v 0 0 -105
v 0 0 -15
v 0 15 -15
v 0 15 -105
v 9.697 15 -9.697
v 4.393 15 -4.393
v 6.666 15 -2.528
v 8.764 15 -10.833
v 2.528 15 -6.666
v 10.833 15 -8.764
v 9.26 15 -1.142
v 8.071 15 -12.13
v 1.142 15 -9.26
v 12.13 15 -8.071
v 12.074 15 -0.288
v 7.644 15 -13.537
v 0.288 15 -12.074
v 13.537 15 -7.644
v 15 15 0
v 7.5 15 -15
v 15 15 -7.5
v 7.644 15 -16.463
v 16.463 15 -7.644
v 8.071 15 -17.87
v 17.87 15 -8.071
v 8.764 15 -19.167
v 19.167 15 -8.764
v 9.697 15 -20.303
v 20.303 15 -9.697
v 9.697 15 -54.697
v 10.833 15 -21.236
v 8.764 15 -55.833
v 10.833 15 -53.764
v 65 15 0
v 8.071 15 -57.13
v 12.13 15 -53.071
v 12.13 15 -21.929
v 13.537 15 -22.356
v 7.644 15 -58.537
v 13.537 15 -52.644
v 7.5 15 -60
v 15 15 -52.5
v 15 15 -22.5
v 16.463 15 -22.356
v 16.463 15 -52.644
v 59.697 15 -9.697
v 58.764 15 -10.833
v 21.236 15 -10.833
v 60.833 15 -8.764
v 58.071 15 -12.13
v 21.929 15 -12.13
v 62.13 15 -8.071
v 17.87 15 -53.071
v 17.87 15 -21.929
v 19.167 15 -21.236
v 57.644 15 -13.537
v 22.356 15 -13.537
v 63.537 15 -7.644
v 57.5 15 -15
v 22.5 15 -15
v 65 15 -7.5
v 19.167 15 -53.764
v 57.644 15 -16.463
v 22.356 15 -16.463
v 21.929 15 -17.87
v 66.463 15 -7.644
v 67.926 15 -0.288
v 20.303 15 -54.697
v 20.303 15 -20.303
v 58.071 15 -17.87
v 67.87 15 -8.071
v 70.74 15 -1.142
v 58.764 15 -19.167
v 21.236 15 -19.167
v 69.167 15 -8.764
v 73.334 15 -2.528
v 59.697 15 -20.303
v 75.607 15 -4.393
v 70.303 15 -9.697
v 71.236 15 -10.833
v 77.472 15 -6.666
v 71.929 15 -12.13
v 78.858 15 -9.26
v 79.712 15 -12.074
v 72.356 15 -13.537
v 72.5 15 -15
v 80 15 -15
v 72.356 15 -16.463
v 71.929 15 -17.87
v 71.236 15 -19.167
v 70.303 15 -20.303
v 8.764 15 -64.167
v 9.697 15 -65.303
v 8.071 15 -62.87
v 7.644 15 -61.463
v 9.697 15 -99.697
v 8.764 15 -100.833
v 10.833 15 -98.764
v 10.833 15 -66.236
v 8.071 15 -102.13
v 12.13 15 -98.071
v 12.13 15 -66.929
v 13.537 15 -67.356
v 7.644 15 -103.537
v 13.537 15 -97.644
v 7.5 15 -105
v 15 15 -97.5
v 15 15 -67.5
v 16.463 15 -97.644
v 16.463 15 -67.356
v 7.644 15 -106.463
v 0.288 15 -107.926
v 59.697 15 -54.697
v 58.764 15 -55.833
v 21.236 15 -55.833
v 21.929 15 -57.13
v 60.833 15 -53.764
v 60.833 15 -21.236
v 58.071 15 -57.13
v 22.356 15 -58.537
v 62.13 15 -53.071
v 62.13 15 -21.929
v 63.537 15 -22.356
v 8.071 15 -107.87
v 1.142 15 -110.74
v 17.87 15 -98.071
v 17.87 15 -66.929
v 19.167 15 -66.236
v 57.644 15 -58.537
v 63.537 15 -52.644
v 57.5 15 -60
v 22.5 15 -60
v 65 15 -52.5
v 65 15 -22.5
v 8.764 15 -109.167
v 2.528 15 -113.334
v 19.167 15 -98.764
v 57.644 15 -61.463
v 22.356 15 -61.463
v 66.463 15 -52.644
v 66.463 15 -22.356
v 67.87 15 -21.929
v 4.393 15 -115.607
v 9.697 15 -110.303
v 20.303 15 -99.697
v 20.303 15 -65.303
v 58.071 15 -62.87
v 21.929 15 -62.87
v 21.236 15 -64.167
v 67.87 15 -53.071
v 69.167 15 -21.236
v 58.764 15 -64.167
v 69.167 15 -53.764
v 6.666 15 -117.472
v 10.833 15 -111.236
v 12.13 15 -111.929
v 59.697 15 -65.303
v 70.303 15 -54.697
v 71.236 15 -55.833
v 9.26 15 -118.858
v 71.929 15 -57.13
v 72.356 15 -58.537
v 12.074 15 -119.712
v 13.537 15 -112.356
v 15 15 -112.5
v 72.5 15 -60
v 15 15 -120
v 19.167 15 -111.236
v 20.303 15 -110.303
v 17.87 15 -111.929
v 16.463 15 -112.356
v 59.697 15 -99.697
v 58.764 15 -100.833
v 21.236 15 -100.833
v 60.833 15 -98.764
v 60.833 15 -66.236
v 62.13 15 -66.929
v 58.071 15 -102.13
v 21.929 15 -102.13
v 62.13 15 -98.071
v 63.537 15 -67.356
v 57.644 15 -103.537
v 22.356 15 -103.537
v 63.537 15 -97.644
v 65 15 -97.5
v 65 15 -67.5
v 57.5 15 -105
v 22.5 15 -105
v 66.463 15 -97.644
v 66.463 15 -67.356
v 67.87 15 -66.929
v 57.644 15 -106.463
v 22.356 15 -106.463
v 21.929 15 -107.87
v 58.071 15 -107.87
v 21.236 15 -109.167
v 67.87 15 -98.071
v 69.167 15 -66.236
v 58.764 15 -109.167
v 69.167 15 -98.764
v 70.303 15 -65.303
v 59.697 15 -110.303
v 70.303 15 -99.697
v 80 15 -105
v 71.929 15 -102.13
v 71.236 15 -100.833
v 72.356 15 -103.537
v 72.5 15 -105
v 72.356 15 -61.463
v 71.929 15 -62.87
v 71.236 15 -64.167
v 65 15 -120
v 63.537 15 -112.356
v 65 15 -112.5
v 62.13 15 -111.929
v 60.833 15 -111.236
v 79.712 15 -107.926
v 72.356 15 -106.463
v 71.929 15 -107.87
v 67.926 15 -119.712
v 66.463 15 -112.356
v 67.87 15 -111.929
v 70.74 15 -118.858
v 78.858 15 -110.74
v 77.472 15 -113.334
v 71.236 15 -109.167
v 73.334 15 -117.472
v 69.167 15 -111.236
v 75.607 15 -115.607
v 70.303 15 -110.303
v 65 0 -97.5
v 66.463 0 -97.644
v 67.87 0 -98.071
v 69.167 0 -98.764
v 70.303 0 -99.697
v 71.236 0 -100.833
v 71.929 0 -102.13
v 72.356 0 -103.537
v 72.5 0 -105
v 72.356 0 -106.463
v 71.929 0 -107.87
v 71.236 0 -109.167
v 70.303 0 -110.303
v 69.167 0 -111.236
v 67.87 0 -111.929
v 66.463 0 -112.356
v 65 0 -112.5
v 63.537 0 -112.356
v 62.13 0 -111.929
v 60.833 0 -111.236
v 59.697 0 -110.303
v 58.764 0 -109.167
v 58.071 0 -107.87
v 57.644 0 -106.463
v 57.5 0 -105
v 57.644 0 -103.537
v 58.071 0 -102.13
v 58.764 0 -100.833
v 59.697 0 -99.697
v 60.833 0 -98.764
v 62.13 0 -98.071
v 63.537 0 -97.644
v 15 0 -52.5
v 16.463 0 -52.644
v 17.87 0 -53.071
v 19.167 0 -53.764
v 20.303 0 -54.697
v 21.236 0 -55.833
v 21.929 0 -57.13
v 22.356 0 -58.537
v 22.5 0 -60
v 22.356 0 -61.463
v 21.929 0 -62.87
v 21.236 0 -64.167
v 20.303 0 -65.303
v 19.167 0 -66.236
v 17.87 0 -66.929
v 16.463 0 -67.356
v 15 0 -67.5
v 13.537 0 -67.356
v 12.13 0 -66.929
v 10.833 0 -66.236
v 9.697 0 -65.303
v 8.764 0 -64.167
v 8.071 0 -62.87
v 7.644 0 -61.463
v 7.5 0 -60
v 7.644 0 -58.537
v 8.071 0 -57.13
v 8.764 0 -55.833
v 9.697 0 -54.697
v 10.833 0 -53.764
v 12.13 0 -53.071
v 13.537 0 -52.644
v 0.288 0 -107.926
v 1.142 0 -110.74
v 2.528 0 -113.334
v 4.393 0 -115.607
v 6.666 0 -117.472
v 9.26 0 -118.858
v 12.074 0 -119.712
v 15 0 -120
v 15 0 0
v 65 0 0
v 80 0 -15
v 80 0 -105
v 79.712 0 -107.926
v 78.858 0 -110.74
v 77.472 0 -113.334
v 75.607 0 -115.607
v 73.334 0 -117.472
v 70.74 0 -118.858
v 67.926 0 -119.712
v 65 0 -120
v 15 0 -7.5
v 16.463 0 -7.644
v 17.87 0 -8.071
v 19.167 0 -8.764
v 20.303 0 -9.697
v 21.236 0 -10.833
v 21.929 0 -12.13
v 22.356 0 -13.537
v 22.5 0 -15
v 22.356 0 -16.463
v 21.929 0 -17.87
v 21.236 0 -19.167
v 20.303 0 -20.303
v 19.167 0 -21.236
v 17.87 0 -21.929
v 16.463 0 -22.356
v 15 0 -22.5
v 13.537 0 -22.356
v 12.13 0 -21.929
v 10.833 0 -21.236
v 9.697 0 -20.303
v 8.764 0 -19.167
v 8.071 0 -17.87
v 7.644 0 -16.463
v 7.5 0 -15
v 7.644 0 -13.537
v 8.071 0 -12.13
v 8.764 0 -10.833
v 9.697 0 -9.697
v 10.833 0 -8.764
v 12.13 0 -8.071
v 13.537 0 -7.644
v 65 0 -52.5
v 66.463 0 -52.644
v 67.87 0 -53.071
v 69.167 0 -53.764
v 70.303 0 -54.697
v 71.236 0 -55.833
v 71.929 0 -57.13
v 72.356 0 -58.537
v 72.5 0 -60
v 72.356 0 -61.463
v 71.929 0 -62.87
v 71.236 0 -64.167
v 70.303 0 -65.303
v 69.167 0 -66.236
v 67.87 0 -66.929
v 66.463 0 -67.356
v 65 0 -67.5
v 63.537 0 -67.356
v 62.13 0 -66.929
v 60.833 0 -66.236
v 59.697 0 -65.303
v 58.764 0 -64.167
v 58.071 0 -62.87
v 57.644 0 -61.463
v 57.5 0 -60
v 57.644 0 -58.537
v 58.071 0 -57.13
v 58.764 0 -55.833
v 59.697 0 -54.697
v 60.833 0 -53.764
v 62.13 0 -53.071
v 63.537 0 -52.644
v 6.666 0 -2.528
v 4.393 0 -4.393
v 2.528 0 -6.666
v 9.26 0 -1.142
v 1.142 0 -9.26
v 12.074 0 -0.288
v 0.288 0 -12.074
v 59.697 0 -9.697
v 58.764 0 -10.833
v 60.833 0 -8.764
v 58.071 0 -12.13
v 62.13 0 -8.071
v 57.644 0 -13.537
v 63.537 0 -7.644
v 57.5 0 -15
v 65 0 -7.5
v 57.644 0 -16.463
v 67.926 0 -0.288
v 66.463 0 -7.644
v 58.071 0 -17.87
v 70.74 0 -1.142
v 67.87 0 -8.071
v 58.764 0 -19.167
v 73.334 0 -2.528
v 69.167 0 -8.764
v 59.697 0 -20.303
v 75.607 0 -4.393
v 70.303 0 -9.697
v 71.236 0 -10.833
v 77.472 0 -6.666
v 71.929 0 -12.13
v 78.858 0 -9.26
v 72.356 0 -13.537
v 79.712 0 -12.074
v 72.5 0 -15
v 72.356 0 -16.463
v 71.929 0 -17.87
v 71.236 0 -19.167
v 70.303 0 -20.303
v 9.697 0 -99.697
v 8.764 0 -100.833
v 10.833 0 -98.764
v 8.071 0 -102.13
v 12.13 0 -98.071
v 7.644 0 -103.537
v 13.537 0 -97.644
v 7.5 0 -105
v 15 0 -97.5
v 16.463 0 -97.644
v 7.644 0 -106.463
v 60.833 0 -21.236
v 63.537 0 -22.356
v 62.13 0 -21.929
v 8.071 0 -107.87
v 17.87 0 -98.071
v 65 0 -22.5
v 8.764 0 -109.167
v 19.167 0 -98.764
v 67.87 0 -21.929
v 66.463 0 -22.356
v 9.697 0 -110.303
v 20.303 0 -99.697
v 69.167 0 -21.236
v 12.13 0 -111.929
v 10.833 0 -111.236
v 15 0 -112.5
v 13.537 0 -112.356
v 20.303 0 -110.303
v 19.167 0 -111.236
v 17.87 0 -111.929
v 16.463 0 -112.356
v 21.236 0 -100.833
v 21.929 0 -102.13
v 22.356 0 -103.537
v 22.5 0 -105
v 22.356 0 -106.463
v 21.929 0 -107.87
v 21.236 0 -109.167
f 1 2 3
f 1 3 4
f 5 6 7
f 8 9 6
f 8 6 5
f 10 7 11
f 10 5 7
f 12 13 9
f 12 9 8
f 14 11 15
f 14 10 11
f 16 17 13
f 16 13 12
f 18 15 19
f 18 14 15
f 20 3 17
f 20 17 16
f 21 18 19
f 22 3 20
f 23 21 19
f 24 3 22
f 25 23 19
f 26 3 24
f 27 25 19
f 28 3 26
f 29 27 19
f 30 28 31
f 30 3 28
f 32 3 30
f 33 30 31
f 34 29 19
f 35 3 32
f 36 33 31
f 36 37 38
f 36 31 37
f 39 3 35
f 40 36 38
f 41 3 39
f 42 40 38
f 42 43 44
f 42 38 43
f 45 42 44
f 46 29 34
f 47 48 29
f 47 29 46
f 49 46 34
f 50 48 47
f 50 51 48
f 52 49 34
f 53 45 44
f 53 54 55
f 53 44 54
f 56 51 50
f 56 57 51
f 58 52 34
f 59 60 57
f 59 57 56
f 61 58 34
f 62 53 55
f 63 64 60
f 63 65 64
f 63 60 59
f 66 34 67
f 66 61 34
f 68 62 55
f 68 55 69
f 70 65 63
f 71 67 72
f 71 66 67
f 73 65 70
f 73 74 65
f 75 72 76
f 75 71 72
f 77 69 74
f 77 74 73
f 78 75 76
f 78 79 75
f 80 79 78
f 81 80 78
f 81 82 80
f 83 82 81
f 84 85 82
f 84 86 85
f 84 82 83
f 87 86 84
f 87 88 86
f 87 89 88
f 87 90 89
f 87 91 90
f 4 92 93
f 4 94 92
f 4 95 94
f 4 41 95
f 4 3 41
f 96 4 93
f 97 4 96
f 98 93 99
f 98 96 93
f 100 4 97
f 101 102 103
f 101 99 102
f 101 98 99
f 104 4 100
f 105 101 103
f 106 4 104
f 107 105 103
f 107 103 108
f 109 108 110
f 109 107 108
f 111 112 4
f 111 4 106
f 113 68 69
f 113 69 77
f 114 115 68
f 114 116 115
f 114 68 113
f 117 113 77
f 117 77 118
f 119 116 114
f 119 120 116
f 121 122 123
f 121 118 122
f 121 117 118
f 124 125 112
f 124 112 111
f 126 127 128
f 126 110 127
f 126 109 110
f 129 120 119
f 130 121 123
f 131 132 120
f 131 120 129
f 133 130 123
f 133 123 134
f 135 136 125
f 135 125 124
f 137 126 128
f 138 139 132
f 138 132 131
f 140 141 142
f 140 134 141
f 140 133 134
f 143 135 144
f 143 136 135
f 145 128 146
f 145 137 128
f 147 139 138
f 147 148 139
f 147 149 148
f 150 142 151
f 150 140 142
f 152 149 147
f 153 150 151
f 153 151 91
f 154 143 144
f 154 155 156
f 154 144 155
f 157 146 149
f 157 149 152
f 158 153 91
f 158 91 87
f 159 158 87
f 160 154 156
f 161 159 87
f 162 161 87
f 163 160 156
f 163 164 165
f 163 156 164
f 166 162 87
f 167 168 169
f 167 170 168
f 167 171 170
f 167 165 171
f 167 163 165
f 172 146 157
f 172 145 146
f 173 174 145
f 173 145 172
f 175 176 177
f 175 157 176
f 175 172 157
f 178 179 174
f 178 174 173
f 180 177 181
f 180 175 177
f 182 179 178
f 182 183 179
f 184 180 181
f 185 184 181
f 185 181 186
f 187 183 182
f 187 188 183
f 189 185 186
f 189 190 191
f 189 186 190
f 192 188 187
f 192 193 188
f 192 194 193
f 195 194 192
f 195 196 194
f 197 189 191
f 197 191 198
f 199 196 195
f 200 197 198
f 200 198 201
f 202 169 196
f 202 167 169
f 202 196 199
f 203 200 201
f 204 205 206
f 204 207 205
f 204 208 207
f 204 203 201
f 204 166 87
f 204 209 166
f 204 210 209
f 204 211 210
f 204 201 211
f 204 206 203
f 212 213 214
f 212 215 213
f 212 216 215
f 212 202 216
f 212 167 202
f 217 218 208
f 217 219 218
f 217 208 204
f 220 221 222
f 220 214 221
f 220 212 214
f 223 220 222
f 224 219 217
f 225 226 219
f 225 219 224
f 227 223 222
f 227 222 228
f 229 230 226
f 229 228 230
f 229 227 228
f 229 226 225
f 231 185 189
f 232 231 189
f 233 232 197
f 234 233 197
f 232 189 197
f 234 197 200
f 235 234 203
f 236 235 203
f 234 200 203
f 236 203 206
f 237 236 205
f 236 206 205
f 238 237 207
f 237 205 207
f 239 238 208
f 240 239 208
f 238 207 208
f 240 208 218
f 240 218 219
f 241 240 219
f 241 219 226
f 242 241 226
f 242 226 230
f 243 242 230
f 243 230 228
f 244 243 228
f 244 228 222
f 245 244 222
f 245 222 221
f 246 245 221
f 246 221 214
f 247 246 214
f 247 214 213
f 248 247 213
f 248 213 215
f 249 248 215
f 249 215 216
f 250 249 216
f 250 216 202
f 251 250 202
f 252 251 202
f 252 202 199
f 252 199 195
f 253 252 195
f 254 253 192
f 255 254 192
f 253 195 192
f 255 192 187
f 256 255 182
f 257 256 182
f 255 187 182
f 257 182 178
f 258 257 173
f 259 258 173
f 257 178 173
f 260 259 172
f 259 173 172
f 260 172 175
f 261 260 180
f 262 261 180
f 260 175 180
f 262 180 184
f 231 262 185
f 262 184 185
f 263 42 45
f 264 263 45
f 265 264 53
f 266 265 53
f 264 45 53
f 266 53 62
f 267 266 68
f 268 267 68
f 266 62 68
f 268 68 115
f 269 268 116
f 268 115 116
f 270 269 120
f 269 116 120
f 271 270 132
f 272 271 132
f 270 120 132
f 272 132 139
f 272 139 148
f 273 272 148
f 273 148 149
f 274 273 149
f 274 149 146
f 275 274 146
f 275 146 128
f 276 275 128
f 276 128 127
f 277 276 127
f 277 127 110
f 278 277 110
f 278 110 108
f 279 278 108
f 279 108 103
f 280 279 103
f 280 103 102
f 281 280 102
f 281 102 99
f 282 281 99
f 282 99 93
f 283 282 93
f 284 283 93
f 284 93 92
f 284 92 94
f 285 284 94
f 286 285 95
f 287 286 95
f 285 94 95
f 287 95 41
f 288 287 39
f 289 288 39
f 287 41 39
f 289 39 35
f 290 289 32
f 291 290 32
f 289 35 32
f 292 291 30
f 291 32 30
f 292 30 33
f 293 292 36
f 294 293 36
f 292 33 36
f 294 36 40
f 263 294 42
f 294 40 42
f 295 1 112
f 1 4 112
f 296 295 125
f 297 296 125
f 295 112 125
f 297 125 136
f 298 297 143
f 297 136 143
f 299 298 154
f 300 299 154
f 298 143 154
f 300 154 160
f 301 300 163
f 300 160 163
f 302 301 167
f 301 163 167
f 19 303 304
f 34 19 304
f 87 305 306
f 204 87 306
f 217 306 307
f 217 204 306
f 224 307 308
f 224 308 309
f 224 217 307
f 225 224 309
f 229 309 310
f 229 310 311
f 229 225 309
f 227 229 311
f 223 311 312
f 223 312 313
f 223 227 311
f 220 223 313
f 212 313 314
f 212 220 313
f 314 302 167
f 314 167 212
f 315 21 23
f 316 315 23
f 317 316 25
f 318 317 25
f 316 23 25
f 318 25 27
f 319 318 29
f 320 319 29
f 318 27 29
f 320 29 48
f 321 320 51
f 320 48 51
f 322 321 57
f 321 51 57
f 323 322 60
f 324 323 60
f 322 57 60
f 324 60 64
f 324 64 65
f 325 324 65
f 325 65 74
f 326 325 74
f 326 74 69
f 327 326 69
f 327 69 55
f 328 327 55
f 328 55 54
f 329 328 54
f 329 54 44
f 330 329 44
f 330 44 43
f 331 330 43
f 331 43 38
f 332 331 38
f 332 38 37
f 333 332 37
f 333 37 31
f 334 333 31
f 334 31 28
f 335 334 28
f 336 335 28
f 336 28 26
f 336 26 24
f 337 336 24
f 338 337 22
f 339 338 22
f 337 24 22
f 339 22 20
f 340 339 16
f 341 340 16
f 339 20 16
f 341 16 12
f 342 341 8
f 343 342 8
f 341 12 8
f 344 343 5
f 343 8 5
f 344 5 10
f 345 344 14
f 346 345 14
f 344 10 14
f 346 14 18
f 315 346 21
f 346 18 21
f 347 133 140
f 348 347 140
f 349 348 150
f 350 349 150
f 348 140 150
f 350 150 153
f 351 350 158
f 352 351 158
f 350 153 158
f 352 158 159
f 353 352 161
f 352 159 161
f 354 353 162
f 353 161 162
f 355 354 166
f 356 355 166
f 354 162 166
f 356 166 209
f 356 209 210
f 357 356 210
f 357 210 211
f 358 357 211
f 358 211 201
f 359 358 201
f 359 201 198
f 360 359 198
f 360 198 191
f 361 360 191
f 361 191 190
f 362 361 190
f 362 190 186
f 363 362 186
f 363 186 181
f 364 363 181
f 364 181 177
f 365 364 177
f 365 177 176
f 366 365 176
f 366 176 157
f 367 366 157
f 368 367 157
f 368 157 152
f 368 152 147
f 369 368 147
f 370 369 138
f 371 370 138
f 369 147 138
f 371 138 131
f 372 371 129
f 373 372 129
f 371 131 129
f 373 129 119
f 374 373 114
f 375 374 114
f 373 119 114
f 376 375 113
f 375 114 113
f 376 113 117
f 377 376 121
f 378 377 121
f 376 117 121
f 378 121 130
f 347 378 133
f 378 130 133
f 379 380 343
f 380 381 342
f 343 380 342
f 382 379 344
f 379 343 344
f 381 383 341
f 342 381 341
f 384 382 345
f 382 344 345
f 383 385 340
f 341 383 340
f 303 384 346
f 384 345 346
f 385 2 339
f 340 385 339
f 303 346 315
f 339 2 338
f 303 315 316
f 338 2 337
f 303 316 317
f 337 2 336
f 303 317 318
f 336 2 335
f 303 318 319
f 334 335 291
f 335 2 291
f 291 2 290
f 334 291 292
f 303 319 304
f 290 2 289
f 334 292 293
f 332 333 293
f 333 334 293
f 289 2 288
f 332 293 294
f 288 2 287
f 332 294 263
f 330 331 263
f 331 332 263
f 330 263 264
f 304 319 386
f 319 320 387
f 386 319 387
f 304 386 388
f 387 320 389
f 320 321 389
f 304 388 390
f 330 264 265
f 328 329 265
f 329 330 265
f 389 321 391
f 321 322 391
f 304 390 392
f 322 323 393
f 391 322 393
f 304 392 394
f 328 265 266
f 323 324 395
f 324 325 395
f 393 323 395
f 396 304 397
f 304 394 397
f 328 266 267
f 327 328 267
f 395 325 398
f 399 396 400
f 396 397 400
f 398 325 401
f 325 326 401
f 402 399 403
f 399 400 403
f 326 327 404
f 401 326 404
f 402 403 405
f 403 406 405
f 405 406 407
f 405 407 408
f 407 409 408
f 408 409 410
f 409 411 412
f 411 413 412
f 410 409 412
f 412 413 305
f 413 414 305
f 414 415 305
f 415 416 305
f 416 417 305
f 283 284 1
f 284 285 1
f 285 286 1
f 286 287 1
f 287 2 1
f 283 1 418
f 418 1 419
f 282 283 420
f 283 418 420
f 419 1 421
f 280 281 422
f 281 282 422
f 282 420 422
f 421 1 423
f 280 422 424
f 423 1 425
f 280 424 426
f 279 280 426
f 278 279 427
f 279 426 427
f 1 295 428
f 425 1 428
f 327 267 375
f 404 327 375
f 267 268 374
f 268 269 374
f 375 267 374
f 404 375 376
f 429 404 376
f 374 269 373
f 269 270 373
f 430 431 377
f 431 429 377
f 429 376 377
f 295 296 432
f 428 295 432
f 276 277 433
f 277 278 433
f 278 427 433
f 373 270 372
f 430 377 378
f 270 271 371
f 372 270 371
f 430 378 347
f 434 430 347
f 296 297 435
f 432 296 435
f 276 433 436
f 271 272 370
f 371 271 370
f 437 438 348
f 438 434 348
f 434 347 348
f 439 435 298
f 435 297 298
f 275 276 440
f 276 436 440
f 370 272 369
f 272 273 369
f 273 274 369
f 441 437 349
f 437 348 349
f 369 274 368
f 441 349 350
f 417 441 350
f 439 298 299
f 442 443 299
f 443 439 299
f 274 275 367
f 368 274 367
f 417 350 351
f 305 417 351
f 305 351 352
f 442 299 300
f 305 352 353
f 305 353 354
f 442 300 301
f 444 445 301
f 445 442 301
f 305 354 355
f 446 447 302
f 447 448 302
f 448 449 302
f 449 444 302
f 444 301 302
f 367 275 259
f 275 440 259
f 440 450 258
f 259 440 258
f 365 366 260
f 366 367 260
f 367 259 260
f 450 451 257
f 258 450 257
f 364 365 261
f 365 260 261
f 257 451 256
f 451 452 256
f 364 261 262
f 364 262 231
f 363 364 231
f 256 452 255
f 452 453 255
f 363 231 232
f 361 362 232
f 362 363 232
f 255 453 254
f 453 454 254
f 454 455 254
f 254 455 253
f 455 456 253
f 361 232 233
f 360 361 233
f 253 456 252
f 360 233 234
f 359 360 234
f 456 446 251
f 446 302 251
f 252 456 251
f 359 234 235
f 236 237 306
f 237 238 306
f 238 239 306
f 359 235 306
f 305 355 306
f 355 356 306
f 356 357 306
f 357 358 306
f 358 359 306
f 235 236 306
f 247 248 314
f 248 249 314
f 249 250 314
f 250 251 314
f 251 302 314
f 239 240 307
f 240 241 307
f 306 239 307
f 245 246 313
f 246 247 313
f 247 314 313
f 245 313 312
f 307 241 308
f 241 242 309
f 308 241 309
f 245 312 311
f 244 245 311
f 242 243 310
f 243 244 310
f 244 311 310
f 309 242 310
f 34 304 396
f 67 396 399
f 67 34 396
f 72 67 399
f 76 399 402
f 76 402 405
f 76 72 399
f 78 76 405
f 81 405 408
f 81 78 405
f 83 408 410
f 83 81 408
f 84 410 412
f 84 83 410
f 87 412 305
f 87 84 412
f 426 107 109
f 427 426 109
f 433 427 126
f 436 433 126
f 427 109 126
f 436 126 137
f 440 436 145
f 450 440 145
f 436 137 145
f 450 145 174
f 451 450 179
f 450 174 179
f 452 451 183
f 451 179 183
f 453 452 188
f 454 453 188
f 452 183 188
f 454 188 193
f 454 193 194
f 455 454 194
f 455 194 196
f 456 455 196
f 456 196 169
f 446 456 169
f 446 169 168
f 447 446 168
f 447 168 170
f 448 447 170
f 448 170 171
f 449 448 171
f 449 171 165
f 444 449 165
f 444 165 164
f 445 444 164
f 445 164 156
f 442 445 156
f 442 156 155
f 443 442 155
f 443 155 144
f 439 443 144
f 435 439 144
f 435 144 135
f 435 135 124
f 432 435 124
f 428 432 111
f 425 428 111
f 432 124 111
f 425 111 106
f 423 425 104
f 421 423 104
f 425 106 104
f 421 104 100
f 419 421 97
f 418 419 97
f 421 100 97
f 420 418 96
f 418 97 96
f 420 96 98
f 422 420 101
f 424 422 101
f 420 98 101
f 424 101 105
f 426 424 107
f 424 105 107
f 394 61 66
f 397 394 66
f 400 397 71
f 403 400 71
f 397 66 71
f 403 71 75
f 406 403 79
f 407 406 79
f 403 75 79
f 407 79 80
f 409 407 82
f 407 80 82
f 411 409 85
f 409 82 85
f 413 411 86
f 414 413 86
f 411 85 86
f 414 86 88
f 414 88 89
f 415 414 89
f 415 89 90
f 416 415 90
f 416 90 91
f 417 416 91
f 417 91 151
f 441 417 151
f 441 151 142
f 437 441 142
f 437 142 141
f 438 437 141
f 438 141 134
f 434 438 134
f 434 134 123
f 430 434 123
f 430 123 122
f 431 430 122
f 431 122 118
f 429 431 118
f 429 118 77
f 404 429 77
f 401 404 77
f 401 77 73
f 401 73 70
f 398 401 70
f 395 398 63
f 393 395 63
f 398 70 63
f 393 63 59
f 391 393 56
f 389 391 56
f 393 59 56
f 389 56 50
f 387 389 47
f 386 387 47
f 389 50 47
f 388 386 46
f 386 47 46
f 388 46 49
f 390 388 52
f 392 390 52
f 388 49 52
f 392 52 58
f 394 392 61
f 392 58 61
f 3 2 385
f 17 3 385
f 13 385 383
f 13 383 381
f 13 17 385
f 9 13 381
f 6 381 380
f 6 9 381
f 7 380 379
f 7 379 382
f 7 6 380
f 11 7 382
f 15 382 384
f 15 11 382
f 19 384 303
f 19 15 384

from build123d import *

# Parameters (mm, degrees)
ESBO_O1_W                = 80
ESBO_O1_H                = 120
RESSALTO_EXTRUS_O1_DEPTH = 15
FILETE1_R                = 15
ESBO_O2_R                = 7.5
CORTE_EXTRUS_O1_DEPTH    = 146


with BuildPart() as part:
    # Esboço1 → Ressalto-extrusão1 (new body)
    with BuildSketch(Plane(origin=(0, 0, 0), x_dir=(1, 0, 0), z_dir=(0, 1, 0))):
        with Locations((40, 60)):
            Rectangle(ESBO_O1_W, ESBO_O1_H)
    extrude(amount=RESSALTO_EXTRUS_O1_DEPTH)

    # Filete1
    filete1_edges = [part.edges().sort_by_distance(p)[0] for p in [
        (0, 7.5, -120),
        (80, 7.5, -120),
        (80, 7.5, 0),
        (0, 7.5, 0),
    ]]
    fillet(filete1_edges, radius=FILETE1_R)

    # Esboço2 → Corte-extrusão1 (cut, through all)
    with BuildSketch(Plane(origin=(0, 15, 0), x_dir=(1, 0, 0), z_dir=(0, 1, 0))):
        with Locations(Location((15, 105, 0), (0, 0, 270))):
            Circle(ESBO_O2_R)
        with Locations(Location((65, 105, 0), (0, 0, 270))):
            Circle(ESBO_O2_R)
        with Locations(Location((65, 60, 0), (0, 0, 270))):
            Circle(ESBO_O2_R)
        with Locations(Location((65, 15, 0), (0, 0, 270))):
            Circle(ESBO_O2_R)
        with Locations(Location((15, 60, 0), (0, 0, 270))):
            Circle(ESBO_O2_R)
        with Locations(Location((15, 15, 0), (0, 0, 270))):
            Circle(ESBO_O2_R)
    extrude(amount=-CORTE_EXTRUS_O1_DEPTH, mode=Mode.SUBTRACT)


solid = part.part
